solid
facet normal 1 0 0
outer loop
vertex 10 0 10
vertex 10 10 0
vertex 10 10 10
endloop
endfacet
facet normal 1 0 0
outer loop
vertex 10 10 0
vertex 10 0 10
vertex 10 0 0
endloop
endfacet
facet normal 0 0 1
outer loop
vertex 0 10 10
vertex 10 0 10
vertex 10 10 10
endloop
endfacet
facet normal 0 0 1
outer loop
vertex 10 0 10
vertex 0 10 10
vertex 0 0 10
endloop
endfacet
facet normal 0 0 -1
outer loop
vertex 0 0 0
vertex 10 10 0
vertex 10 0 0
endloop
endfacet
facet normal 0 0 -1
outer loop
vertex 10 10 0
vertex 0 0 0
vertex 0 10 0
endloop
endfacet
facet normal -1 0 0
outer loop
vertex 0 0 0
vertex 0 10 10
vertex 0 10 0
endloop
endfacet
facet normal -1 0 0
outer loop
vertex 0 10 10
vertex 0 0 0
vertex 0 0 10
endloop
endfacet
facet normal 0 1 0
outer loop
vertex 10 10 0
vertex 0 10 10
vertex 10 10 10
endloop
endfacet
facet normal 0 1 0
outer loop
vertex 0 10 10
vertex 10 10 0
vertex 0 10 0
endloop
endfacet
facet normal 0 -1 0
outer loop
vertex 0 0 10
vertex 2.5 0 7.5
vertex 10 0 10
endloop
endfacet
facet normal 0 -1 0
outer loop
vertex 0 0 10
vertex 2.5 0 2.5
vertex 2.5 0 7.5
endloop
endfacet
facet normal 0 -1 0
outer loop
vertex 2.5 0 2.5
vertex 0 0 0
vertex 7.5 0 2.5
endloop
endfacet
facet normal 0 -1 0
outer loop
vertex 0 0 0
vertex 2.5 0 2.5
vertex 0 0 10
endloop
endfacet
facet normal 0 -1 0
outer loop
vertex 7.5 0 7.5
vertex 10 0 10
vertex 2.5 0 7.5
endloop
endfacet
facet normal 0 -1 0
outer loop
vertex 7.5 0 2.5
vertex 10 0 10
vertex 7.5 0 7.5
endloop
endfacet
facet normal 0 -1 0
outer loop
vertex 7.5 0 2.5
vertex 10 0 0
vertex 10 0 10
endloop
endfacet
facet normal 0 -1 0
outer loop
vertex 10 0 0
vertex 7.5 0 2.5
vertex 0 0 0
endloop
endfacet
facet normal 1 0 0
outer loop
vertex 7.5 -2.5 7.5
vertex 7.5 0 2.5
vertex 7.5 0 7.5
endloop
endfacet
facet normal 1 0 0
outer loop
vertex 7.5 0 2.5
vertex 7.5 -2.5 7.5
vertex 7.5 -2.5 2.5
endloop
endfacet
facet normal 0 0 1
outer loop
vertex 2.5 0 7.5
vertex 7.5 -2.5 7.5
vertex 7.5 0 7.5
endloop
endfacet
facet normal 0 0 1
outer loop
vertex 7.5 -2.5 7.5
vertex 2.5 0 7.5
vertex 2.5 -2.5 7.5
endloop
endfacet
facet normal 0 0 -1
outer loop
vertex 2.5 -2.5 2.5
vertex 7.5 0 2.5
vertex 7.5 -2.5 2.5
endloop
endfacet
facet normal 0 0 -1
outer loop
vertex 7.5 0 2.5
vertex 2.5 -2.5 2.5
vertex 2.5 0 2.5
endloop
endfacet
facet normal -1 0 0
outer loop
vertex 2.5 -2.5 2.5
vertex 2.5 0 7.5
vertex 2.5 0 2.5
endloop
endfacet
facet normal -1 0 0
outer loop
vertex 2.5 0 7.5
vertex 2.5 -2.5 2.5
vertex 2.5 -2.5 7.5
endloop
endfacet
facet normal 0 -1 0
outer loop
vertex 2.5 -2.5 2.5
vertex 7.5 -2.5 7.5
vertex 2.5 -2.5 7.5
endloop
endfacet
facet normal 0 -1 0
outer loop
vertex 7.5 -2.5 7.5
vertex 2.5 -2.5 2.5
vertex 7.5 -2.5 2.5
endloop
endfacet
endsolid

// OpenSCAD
cube(10,10,10);

translate([2.5,-2.5,2.5]) {
	cube(5,5,5);
}
